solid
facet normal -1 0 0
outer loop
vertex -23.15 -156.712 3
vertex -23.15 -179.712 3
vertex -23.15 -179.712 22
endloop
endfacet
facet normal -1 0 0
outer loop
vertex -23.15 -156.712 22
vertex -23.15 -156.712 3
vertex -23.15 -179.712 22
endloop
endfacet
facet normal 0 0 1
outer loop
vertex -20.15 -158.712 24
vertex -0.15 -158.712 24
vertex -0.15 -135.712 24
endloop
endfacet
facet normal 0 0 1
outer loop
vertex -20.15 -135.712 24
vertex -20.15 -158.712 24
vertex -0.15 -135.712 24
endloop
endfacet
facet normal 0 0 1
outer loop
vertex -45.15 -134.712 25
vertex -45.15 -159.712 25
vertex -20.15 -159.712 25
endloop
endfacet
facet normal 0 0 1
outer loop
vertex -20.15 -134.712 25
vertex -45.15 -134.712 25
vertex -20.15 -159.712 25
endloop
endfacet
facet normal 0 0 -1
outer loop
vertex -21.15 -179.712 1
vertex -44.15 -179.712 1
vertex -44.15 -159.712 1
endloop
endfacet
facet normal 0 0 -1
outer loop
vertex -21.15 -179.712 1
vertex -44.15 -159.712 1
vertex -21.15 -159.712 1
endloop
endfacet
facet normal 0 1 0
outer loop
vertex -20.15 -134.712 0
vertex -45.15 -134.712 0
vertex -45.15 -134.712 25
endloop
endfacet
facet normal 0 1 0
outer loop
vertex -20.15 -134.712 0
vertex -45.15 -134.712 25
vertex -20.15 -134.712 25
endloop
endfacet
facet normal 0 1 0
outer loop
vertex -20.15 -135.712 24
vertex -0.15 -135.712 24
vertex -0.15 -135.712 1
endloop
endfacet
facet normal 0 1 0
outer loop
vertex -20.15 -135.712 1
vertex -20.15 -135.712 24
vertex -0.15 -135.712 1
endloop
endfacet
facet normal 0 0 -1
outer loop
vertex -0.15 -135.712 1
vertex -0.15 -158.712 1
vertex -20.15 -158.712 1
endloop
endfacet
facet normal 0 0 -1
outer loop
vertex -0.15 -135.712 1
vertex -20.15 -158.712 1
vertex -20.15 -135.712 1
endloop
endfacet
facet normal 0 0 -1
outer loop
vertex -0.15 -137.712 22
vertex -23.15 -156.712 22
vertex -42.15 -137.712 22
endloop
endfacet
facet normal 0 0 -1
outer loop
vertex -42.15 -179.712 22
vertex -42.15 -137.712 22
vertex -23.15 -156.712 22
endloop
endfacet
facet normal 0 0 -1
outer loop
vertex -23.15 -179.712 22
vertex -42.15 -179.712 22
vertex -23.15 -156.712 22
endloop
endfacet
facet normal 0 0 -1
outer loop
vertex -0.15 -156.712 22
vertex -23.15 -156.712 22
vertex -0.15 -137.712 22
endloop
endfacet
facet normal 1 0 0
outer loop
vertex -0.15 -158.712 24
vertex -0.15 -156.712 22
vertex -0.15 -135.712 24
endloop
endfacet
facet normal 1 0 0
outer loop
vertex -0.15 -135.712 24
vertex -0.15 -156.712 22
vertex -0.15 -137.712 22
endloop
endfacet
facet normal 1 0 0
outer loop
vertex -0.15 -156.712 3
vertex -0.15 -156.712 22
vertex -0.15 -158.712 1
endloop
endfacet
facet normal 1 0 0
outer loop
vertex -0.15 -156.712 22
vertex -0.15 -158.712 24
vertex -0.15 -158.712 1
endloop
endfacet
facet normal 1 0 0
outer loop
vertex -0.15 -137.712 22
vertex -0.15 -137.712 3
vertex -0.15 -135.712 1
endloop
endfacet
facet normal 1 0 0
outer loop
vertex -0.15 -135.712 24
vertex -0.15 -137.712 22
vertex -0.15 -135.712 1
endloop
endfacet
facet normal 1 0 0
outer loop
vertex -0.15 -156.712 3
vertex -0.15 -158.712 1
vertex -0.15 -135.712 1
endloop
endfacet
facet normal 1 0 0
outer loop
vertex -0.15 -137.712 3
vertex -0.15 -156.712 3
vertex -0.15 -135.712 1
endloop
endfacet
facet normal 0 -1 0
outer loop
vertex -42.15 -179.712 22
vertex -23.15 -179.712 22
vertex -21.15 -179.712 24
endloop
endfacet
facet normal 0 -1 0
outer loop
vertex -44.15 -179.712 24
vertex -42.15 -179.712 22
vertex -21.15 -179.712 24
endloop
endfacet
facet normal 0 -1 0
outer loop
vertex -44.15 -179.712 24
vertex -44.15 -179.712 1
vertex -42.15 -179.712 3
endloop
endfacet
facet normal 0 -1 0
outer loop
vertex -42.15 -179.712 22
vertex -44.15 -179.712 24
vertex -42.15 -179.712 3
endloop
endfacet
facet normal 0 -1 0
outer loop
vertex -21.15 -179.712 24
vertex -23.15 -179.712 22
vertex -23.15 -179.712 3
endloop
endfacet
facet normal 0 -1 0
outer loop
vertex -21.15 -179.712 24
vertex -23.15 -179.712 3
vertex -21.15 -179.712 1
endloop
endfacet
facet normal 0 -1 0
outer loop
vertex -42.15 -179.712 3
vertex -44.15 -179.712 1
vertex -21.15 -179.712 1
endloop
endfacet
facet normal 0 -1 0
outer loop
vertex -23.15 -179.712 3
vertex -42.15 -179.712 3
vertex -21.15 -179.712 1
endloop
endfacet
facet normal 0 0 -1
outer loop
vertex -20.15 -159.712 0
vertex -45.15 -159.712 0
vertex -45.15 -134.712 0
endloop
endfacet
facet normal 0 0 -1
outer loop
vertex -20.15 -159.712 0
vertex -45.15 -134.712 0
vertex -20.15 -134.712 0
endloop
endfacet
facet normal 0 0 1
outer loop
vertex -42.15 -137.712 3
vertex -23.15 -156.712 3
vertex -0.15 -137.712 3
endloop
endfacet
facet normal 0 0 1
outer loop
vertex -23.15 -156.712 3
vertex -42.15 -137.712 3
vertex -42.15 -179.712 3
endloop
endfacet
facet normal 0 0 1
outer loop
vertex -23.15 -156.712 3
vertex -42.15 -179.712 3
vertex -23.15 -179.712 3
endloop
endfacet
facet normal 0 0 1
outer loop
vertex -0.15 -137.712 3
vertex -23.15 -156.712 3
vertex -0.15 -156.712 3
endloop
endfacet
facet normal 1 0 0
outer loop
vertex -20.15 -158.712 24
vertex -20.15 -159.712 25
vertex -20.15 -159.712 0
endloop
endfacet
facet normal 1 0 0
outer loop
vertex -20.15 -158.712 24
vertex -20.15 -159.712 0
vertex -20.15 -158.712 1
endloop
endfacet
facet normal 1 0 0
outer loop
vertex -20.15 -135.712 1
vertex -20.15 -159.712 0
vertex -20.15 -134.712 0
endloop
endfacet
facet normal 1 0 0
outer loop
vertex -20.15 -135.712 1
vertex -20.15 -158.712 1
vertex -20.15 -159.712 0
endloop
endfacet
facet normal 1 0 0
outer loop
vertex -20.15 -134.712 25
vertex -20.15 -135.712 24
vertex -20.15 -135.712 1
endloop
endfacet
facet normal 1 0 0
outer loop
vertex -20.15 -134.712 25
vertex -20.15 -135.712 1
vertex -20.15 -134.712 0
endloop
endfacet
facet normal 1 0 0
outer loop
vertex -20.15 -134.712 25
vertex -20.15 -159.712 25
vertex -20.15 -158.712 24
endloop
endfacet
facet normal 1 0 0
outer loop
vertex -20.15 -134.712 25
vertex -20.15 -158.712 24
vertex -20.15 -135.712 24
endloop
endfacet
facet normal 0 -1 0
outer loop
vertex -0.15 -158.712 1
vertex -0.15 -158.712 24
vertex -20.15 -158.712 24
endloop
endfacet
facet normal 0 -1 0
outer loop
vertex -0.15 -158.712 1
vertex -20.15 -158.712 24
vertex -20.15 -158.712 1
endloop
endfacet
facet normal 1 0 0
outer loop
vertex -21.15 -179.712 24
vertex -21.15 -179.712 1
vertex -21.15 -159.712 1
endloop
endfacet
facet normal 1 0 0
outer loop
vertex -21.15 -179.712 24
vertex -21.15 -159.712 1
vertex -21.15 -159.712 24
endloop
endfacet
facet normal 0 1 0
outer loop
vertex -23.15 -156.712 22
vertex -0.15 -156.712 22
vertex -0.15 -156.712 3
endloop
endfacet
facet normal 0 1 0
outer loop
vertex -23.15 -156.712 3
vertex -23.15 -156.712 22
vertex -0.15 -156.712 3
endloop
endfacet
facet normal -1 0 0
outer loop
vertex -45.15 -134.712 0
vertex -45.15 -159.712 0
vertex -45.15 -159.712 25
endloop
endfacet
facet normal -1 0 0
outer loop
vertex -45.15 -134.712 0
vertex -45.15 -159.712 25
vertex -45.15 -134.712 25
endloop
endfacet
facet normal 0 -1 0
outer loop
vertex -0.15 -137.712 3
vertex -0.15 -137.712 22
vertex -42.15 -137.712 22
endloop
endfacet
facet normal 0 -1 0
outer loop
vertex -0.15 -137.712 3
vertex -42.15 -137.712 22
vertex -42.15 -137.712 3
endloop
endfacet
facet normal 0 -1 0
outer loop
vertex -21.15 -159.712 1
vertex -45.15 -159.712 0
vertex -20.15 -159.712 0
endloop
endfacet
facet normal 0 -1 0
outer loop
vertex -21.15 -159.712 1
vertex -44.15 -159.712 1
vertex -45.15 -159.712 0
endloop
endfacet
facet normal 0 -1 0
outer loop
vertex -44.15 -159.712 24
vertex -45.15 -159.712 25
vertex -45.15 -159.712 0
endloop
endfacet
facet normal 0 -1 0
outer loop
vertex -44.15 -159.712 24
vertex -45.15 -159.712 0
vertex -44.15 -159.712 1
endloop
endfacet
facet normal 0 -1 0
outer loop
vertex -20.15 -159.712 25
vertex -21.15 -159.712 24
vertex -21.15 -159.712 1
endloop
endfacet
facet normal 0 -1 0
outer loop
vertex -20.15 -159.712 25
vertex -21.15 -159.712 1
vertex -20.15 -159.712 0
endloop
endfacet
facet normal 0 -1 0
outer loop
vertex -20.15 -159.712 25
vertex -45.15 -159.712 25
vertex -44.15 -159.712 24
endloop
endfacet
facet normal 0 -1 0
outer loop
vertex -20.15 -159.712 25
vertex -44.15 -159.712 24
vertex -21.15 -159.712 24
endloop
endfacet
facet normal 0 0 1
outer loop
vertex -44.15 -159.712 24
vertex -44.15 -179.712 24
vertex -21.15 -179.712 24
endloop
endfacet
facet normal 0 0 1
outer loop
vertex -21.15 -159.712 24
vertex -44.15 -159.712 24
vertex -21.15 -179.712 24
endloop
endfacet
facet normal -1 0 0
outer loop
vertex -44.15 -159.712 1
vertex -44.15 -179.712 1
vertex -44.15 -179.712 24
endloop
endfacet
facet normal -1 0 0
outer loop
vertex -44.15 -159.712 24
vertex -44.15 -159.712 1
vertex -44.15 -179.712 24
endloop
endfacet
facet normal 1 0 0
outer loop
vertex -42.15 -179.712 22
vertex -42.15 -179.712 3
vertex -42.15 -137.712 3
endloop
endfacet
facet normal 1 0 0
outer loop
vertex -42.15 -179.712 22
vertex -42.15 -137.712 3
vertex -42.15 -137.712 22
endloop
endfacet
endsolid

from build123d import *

# Parameters (mm, degrees)
SKETCH1_W           = 45
SKETCH1_H           = 45
BOSS_EXTRUDE1_DEPTH = 25
SKETCH2_W           = 20
SKETCH2_H           = 20
CUT_EXTRUDE1_DEPTH  = 187.975674979
SKETCH3_W           = 25
SKETCH3_H           = 25
SKETCH3_W_2         = 23
SKETCH3_H_2         = 23
CUT_EXTRUDE2_DEPTH  = 20
SKETCH4_W           = 25
SKETCH4_H           = 25
SKETCH4_W_2         = 23
SKETCH4_H_2         = 23
CUT_EXTRUDE3_DEPTH  = 20
SKETCH7_W           = 19
SKETCH7_H           = 19
CUT_EXTRUDE7_DEPTH  = 42
SKETCH8_W           = 19
SKETCH8_H           = 19
CUT_EXTRUDE8_DEPTH  = 42


with BuildPart() as part:
    # Sketch1 → Boss-Extrude1 (new body)
    with BuildSketch(Plane.XY):
        with Locations((-22.649542037, -157.212052706)):
            Rectangle(SKETCH1_W, SKETCH1_H)
    extrude(amount=BOSS_EXTRUDE1_DEPTH)

    # Sketch2 → Cut-Extrude1 (cut, through all)
    with BuildSketch(Plane.XY.offset(25)):
        with Locations((-10.149542037, -169.712052706)):
            Rectangle(SKETCH2_W, SKETCH2_H)
    extrude(amount=-CUT_EXTRUDE1_DEPTH, mode=Mode.SUBTRACT)

    # Sketch3 → Cut-Extrude2 (cut)
    with BuildSketch(Plane(origin=(-0.149542037, 0, 0), x_dir=(0, 0, -1), z_dir=(1, 0, 0))):
        with Locations((-12.5, -147.212052706)):
            Rectangle(SKETCH3_W, SKETCH3_H)
        with Locations((-12.5, -147.212052706)):
            Rectangle(SKETCH3_W_2, SKETCH3_H_2, mode=Mode.SUBTRACT)
    extrude(amount=-CUT_EXTRUDE2_DEPTH, mode=Mode.SUBTRACT)

    # Sketch4 → Cut-Extrude3 (cut)
    with BuildSketch(Plane.XZ.offset(179.712052706)):
        with Locations((-32.649542037, 12.5)):
            Rectangle(SKETCH4_W, SKETCH4_H)
        with Locations((-32.649542037, 12.5)):
            Rectangle(SKETCH4_W_2, SKETCH4_H_2, mode=Mode.SUBTRACT)
    extrude(amount=-CUT_EXTRUDE3_DEPTH, mode=Mode.SUBTRACT)

    # Sketch7 → Cut-Extrude7 (cut)
    with BuildSketch(Plane(origin=(-0.149542037, 0, 0), x_dir=(0, 0, -1), z_dir=(1, 0, 0))):
        with Locations((-12.5, -147.212052706)):
            Rectangle(SKETCH7_W, SKETCH7_H)
    extrude(amount=-CUT_EXTRUDE7_DEPTH, mode=Mode.SUBTRACT)

    # Sketch8 → Cut-Extrude8 (cut)
    with BuildSketch(Plane.XZ.offset(179.712052706)):
        with Locations((-32.649542037, 12.5)):
            Rectangle(SKETCH8_W, SKETCH8_H)
    extrude(amount=-CUT_EXTRUDE8_DEPTH, mode=Mode.SUBTRACT)


solid = part.part
